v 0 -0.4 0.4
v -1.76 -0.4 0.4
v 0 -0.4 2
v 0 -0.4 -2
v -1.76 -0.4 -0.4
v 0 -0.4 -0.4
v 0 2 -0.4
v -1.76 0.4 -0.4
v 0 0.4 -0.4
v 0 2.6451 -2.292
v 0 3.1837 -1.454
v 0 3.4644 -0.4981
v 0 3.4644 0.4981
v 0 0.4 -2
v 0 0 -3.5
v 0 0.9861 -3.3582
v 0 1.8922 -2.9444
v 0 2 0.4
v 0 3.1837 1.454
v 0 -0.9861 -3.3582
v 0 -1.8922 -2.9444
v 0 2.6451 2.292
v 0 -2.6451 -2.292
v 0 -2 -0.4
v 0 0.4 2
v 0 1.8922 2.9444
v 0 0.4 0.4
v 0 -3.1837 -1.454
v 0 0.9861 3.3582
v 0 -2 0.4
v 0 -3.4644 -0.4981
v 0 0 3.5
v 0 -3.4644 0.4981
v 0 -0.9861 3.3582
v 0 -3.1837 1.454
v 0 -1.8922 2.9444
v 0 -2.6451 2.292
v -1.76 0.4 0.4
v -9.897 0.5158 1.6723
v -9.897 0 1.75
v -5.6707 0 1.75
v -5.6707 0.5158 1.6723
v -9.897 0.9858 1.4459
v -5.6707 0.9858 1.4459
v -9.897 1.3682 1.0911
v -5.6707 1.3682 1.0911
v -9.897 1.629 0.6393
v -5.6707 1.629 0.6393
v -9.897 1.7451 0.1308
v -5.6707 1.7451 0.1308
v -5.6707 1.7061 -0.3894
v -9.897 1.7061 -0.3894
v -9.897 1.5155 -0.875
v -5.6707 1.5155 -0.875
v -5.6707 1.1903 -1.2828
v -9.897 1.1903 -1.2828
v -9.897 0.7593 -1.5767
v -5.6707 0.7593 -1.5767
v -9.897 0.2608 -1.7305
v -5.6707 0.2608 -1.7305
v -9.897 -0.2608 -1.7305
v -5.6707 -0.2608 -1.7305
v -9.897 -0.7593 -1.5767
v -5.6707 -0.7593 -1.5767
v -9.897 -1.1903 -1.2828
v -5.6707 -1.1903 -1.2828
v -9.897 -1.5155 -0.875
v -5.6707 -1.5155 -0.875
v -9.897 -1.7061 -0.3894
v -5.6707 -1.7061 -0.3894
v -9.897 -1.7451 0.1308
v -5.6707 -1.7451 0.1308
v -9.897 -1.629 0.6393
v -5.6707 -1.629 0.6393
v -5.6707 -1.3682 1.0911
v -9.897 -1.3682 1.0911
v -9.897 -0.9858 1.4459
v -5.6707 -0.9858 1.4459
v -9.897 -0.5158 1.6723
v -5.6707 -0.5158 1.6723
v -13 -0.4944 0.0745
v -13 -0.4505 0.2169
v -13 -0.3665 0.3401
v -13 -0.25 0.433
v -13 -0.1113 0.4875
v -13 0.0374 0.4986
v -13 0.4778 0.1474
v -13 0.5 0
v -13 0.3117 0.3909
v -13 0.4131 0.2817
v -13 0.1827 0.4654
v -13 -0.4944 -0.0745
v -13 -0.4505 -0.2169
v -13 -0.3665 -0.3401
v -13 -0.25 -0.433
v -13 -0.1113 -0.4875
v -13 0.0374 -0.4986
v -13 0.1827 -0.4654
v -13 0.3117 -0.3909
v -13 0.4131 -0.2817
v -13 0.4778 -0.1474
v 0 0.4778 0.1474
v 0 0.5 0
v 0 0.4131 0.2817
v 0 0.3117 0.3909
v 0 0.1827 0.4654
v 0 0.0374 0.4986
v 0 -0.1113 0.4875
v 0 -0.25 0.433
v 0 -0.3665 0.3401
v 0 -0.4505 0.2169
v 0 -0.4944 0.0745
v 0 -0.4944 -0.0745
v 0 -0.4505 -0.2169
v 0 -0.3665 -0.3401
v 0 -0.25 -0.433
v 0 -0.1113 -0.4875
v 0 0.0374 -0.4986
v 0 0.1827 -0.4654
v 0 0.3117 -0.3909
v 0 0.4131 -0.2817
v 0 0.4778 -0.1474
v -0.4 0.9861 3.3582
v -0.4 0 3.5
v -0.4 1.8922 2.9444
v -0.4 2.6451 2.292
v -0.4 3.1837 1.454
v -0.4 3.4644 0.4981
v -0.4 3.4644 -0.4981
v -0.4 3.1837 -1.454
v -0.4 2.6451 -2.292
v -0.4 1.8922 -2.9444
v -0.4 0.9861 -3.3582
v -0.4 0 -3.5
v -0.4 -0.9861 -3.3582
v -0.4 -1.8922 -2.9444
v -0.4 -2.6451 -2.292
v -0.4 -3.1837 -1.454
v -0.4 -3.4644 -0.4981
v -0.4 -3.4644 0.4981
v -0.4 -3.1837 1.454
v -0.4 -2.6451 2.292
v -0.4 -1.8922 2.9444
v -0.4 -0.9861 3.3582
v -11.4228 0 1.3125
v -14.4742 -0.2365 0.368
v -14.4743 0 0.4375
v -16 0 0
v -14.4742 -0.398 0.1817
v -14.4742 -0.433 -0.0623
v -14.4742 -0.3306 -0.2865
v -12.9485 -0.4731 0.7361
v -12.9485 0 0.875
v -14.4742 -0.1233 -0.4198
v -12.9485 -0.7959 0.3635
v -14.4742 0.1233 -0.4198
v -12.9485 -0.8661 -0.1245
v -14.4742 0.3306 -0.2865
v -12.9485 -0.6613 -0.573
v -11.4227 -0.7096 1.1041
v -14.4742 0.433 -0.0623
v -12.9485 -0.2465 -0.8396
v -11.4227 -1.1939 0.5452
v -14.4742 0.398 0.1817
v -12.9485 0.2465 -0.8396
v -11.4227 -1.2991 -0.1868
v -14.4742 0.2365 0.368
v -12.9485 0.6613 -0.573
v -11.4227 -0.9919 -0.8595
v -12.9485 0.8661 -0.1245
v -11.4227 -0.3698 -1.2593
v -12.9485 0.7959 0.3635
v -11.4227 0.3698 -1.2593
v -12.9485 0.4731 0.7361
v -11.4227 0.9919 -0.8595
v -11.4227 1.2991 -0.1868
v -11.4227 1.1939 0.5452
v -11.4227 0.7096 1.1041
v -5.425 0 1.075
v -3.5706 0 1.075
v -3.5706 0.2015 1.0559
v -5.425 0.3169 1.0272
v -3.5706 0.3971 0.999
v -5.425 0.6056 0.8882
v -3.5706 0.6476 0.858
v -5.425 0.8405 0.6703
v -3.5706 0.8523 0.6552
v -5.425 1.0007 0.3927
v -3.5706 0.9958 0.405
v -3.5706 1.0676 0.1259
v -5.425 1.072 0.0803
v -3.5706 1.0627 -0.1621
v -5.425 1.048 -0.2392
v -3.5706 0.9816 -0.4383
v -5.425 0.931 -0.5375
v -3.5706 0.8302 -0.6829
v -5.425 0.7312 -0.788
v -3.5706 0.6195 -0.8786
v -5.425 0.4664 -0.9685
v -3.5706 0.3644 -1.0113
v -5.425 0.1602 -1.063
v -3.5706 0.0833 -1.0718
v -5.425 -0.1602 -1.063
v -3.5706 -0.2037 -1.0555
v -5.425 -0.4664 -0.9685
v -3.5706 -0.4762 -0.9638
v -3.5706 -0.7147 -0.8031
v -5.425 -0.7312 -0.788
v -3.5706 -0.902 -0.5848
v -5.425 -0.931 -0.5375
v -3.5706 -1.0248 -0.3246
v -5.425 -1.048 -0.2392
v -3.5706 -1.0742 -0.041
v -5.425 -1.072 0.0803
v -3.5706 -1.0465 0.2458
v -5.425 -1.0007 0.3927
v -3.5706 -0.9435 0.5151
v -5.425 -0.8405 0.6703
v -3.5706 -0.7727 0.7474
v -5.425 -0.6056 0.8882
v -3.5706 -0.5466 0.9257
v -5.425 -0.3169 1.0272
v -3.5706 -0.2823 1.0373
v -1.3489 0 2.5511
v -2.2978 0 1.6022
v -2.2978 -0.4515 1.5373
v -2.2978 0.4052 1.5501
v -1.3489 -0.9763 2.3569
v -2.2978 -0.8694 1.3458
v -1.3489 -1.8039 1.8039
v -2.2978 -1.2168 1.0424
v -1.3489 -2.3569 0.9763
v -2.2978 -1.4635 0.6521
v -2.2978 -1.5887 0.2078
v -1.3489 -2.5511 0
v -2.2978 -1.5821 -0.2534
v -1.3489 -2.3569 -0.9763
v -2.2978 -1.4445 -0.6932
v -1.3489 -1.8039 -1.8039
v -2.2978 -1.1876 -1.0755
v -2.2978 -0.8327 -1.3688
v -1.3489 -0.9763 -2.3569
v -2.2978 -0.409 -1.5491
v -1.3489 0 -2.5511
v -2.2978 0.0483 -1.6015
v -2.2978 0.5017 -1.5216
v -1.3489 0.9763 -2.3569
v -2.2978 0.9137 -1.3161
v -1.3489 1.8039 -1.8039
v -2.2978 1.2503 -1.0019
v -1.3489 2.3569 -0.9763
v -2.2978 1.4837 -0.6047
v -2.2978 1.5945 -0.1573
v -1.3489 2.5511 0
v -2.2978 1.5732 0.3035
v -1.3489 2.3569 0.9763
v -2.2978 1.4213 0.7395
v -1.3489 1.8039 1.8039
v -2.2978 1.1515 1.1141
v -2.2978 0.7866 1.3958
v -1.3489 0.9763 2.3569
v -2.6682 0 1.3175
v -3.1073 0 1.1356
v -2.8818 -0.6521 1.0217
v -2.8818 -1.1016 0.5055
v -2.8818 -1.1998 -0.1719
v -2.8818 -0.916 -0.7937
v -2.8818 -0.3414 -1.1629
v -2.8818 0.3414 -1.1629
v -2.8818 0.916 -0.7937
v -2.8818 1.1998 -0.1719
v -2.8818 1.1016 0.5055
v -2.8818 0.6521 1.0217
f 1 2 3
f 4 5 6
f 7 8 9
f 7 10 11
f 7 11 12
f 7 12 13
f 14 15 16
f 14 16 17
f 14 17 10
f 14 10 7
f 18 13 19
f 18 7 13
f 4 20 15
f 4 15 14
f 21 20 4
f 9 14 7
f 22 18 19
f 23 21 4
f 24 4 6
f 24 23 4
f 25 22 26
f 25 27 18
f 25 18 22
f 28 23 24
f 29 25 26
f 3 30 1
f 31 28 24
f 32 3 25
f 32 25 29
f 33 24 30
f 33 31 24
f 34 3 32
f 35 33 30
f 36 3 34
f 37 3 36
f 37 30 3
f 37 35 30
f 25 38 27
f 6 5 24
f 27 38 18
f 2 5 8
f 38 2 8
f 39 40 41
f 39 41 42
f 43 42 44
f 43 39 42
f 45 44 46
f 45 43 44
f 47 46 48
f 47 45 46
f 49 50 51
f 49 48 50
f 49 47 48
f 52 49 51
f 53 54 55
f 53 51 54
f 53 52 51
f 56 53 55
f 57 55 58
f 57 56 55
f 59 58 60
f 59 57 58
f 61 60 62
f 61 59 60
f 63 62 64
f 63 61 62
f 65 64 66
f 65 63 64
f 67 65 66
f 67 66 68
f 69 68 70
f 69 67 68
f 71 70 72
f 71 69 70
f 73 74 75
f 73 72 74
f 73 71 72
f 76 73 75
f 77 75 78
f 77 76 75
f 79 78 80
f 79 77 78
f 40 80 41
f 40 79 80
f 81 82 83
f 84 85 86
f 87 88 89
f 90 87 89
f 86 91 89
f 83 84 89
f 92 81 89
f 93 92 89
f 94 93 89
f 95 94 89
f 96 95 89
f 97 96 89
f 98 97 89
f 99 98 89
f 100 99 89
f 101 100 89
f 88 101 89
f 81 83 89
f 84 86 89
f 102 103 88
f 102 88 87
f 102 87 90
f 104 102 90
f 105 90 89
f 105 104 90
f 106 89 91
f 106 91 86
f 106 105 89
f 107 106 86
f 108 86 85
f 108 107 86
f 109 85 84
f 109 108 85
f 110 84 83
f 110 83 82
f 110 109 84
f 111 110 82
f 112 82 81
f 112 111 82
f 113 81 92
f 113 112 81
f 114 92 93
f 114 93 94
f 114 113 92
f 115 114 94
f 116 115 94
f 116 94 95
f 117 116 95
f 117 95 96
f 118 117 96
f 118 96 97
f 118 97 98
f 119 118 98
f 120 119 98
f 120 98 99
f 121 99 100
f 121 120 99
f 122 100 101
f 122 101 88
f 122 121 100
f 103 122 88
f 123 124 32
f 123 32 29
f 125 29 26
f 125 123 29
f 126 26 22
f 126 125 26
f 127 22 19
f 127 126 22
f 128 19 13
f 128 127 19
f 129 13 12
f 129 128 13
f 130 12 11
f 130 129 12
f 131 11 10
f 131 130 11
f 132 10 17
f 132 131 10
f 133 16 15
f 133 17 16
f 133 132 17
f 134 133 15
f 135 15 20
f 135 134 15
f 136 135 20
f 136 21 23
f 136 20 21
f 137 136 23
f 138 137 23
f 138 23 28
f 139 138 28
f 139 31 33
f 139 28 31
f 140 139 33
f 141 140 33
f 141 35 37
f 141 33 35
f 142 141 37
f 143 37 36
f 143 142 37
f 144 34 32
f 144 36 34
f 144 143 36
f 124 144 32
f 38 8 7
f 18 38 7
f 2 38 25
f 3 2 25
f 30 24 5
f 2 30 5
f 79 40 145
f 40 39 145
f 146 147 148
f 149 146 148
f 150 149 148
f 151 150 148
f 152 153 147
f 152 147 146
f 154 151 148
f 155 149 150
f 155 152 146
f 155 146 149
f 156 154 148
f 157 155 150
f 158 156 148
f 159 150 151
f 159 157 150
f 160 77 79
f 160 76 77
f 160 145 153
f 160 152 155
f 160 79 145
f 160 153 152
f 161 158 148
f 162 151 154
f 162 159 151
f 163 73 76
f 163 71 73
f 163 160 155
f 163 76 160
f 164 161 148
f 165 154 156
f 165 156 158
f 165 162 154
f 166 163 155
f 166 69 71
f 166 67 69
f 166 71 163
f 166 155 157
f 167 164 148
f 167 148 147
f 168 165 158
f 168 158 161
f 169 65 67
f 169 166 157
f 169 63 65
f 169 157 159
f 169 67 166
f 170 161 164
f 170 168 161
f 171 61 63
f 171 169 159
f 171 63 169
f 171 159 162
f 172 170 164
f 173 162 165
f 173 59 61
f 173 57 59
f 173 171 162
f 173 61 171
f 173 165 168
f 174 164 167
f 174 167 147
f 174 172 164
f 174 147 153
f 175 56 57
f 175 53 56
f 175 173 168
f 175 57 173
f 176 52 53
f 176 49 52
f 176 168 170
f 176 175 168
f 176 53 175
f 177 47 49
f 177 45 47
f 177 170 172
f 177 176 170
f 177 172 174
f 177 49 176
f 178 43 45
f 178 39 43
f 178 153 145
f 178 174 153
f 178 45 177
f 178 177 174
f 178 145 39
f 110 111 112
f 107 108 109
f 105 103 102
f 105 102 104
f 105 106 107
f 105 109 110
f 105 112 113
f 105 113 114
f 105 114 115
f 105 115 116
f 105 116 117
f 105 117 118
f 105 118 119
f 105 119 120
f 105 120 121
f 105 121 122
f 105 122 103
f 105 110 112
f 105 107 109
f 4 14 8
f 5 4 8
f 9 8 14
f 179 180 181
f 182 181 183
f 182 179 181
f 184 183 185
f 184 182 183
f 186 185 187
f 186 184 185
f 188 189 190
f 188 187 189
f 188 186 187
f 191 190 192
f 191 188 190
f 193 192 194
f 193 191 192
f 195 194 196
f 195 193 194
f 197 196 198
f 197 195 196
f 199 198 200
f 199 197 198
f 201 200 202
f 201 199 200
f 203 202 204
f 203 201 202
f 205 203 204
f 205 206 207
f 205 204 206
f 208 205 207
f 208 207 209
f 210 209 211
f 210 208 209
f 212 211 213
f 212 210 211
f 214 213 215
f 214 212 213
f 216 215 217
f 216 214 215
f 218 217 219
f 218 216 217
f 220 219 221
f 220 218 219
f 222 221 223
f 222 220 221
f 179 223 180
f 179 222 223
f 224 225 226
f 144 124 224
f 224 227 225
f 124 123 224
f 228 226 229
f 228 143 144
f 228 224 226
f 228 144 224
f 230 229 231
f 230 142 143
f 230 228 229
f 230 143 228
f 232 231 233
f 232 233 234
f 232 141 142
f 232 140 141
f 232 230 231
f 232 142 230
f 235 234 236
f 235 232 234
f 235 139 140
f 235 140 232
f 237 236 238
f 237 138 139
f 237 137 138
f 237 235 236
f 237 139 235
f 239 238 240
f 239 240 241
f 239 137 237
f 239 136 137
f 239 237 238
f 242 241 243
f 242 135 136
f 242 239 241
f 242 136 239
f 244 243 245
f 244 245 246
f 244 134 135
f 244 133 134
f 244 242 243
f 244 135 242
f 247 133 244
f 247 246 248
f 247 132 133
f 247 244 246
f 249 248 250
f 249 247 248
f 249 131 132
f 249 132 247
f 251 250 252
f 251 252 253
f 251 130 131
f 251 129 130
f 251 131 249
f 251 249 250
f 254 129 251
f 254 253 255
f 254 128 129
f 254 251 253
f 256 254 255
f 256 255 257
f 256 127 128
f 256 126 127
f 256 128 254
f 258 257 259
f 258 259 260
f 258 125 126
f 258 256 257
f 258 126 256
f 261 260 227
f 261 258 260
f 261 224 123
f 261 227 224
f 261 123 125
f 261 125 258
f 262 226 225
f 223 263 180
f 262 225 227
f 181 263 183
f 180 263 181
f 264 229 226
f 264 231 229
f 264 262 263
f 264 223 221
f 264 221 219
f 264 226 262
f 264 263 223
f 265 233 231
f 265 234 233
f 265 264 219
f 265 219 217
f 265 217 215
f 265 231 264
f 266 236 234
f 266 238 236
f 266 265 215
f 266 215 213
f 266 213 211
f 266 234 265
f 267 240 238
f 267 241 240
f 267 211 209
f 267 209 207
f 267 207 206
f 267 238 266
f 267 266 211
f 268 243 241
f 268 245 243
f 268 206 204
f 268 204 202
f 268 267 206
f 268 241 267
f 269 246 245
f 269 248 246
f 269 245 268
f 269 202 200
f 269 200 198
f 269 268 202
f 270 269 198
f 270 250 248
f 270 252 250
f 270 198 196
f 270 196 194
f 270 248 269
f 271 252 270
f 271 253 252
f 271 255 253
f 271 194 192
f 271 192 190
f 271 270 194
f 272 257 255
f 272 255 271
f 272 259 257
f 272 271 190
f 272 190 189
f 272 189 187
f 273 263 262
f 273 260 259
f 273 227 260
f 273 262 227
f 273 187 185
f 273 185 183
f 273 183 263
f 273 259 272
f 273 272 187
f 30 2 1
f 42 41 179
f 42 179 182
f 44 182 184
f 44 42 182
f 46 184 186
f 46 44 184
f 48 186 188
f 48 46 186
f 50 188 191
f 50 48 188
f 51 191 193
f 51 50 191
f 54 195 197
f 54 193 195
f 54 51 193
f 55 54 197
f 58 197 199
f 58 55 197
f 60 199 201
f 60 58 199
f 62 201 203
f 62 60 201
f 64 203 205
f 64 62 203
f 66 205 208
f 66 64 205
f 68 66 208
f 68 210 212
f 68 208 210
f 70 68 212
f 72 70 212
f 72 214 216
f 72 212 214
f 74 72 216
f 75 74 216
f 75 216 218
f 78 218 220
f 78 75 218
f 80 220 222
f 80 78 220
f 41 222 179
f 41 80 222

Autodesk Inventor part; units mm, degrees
ref_plane "YZ Plane" through (0, 0, 0) normal (1, 0, 0) x (0, 1, 0)
ref_plane "XZ Plane" through (0, 0, 0) normal (0, 1, 0) x (-1, 0, 0)
ref_plane "XY Plane" through (0, 0, 0) normal (0, 0, 1) x (1, 0, 0)
sketch "Sketch1" plane through (0, 0, 0) normal (0, 1, 0) x (-1, 0, 0)
  line L0 (0, 0) -> (0, 3.5)
  line L1 (0, 3.5) -> (0.4, 3.5)
  line L2 (0.4, 3.5) -> (2.825, 1.075)
  line L3 (2.825, 1.075) -> (5.425, 1.075)
  line L4 (5.425, 1.075) -> (5.6707, 1.75)
  line L5 (5.6707, 1.75) -> (9.897, 1.75)
  line L6 (9.897, 1.75) -> (16, 0)
  line L7 (16, 0) -> (0, 0)
  dimension "d0" = 7
  dimension "d1" = 45
  dimension "d2" = 16
  dimension "d3" = 2.6
  dimension "d4" = 110
  dimension "d5" = 2.15
  dimension "d6" = 3.5
  dimension "d7" = 0.4
  dimension "d8" = 16
revolve "Revolution1" add sketch "Sketch1" angle 360 about axis through (-16, 0, 0) along (1, 0, 0)
sketch "Sketch2" plane through (0, 0, 0) normal (0, 0, 1) x (1, 0, 0)
  line L0 (0, 3.5) -> (0, -3.5) projected
  line L1 (0, -2) -> (-1.76, -0.4)
  line L2 (-1.76, -0.4) -> (-1.76, 0.4)
  line L3 (-1.76, 0.4) -> (0, 2)
  line L4 (-2.112, 0) -> (0.352, 0) projected
  point P0 (0, 0)
  dimension "d10" = 4
  dimension "d11" = 1.76
  dimension "d12" = 0.8
extrude "Extrusion1" cut sketch "Sketch2" along normal mid plane 0.8
pattern_circular "Circular Pattern1" count 2 over 90 about axis through (-10, 0, 0) along (1, 0, 0) of "Extrusion1"
fillet "Fillet1" radius 1.8 1 edges at (-2.825, 0, -1.075)
thread "Thread1" size "R 3" standard "ISO Taper" full length
sketch "Sketch3" plane through (0, 0, 0) normal (1, 0, 0) x (0, 1, 0)
  circle A0 centre (0, 0) radius 0.5
  dimension "d21" = 1
extrude "Extrusion2" add sketch "Sketch3" against normal blind 13 separate body
thread "Thread2" size "R 6" standard "ISO Taper" full length
equation "\"d10\" = M"
equation "\"d11\" = Q"
equation "\"d18\" = R"
equation "\"d19\" = L"
equation "\"d0\" = A_H"
equation "\"d3\" = a"
equation "\"d5\" = d"
equation "\"d6\" = D"
equation "\"d8\" = L"
equation "\"D\" = 3.5"
equation "\"a\" = 2.6"
equation "\"d\" = 2.15"
equation "\"P\" = 1.6"
equation "\"Q\" = 1.76"
equation "\"M\" = 4"
equation "\"A_H\" = 7"
equation "\"R\" = 1.8"
equation "\"L\" = 16"
properties part number "Wood screw Cross Recessed Flat Head M3.5x16 H" material "Steel"
